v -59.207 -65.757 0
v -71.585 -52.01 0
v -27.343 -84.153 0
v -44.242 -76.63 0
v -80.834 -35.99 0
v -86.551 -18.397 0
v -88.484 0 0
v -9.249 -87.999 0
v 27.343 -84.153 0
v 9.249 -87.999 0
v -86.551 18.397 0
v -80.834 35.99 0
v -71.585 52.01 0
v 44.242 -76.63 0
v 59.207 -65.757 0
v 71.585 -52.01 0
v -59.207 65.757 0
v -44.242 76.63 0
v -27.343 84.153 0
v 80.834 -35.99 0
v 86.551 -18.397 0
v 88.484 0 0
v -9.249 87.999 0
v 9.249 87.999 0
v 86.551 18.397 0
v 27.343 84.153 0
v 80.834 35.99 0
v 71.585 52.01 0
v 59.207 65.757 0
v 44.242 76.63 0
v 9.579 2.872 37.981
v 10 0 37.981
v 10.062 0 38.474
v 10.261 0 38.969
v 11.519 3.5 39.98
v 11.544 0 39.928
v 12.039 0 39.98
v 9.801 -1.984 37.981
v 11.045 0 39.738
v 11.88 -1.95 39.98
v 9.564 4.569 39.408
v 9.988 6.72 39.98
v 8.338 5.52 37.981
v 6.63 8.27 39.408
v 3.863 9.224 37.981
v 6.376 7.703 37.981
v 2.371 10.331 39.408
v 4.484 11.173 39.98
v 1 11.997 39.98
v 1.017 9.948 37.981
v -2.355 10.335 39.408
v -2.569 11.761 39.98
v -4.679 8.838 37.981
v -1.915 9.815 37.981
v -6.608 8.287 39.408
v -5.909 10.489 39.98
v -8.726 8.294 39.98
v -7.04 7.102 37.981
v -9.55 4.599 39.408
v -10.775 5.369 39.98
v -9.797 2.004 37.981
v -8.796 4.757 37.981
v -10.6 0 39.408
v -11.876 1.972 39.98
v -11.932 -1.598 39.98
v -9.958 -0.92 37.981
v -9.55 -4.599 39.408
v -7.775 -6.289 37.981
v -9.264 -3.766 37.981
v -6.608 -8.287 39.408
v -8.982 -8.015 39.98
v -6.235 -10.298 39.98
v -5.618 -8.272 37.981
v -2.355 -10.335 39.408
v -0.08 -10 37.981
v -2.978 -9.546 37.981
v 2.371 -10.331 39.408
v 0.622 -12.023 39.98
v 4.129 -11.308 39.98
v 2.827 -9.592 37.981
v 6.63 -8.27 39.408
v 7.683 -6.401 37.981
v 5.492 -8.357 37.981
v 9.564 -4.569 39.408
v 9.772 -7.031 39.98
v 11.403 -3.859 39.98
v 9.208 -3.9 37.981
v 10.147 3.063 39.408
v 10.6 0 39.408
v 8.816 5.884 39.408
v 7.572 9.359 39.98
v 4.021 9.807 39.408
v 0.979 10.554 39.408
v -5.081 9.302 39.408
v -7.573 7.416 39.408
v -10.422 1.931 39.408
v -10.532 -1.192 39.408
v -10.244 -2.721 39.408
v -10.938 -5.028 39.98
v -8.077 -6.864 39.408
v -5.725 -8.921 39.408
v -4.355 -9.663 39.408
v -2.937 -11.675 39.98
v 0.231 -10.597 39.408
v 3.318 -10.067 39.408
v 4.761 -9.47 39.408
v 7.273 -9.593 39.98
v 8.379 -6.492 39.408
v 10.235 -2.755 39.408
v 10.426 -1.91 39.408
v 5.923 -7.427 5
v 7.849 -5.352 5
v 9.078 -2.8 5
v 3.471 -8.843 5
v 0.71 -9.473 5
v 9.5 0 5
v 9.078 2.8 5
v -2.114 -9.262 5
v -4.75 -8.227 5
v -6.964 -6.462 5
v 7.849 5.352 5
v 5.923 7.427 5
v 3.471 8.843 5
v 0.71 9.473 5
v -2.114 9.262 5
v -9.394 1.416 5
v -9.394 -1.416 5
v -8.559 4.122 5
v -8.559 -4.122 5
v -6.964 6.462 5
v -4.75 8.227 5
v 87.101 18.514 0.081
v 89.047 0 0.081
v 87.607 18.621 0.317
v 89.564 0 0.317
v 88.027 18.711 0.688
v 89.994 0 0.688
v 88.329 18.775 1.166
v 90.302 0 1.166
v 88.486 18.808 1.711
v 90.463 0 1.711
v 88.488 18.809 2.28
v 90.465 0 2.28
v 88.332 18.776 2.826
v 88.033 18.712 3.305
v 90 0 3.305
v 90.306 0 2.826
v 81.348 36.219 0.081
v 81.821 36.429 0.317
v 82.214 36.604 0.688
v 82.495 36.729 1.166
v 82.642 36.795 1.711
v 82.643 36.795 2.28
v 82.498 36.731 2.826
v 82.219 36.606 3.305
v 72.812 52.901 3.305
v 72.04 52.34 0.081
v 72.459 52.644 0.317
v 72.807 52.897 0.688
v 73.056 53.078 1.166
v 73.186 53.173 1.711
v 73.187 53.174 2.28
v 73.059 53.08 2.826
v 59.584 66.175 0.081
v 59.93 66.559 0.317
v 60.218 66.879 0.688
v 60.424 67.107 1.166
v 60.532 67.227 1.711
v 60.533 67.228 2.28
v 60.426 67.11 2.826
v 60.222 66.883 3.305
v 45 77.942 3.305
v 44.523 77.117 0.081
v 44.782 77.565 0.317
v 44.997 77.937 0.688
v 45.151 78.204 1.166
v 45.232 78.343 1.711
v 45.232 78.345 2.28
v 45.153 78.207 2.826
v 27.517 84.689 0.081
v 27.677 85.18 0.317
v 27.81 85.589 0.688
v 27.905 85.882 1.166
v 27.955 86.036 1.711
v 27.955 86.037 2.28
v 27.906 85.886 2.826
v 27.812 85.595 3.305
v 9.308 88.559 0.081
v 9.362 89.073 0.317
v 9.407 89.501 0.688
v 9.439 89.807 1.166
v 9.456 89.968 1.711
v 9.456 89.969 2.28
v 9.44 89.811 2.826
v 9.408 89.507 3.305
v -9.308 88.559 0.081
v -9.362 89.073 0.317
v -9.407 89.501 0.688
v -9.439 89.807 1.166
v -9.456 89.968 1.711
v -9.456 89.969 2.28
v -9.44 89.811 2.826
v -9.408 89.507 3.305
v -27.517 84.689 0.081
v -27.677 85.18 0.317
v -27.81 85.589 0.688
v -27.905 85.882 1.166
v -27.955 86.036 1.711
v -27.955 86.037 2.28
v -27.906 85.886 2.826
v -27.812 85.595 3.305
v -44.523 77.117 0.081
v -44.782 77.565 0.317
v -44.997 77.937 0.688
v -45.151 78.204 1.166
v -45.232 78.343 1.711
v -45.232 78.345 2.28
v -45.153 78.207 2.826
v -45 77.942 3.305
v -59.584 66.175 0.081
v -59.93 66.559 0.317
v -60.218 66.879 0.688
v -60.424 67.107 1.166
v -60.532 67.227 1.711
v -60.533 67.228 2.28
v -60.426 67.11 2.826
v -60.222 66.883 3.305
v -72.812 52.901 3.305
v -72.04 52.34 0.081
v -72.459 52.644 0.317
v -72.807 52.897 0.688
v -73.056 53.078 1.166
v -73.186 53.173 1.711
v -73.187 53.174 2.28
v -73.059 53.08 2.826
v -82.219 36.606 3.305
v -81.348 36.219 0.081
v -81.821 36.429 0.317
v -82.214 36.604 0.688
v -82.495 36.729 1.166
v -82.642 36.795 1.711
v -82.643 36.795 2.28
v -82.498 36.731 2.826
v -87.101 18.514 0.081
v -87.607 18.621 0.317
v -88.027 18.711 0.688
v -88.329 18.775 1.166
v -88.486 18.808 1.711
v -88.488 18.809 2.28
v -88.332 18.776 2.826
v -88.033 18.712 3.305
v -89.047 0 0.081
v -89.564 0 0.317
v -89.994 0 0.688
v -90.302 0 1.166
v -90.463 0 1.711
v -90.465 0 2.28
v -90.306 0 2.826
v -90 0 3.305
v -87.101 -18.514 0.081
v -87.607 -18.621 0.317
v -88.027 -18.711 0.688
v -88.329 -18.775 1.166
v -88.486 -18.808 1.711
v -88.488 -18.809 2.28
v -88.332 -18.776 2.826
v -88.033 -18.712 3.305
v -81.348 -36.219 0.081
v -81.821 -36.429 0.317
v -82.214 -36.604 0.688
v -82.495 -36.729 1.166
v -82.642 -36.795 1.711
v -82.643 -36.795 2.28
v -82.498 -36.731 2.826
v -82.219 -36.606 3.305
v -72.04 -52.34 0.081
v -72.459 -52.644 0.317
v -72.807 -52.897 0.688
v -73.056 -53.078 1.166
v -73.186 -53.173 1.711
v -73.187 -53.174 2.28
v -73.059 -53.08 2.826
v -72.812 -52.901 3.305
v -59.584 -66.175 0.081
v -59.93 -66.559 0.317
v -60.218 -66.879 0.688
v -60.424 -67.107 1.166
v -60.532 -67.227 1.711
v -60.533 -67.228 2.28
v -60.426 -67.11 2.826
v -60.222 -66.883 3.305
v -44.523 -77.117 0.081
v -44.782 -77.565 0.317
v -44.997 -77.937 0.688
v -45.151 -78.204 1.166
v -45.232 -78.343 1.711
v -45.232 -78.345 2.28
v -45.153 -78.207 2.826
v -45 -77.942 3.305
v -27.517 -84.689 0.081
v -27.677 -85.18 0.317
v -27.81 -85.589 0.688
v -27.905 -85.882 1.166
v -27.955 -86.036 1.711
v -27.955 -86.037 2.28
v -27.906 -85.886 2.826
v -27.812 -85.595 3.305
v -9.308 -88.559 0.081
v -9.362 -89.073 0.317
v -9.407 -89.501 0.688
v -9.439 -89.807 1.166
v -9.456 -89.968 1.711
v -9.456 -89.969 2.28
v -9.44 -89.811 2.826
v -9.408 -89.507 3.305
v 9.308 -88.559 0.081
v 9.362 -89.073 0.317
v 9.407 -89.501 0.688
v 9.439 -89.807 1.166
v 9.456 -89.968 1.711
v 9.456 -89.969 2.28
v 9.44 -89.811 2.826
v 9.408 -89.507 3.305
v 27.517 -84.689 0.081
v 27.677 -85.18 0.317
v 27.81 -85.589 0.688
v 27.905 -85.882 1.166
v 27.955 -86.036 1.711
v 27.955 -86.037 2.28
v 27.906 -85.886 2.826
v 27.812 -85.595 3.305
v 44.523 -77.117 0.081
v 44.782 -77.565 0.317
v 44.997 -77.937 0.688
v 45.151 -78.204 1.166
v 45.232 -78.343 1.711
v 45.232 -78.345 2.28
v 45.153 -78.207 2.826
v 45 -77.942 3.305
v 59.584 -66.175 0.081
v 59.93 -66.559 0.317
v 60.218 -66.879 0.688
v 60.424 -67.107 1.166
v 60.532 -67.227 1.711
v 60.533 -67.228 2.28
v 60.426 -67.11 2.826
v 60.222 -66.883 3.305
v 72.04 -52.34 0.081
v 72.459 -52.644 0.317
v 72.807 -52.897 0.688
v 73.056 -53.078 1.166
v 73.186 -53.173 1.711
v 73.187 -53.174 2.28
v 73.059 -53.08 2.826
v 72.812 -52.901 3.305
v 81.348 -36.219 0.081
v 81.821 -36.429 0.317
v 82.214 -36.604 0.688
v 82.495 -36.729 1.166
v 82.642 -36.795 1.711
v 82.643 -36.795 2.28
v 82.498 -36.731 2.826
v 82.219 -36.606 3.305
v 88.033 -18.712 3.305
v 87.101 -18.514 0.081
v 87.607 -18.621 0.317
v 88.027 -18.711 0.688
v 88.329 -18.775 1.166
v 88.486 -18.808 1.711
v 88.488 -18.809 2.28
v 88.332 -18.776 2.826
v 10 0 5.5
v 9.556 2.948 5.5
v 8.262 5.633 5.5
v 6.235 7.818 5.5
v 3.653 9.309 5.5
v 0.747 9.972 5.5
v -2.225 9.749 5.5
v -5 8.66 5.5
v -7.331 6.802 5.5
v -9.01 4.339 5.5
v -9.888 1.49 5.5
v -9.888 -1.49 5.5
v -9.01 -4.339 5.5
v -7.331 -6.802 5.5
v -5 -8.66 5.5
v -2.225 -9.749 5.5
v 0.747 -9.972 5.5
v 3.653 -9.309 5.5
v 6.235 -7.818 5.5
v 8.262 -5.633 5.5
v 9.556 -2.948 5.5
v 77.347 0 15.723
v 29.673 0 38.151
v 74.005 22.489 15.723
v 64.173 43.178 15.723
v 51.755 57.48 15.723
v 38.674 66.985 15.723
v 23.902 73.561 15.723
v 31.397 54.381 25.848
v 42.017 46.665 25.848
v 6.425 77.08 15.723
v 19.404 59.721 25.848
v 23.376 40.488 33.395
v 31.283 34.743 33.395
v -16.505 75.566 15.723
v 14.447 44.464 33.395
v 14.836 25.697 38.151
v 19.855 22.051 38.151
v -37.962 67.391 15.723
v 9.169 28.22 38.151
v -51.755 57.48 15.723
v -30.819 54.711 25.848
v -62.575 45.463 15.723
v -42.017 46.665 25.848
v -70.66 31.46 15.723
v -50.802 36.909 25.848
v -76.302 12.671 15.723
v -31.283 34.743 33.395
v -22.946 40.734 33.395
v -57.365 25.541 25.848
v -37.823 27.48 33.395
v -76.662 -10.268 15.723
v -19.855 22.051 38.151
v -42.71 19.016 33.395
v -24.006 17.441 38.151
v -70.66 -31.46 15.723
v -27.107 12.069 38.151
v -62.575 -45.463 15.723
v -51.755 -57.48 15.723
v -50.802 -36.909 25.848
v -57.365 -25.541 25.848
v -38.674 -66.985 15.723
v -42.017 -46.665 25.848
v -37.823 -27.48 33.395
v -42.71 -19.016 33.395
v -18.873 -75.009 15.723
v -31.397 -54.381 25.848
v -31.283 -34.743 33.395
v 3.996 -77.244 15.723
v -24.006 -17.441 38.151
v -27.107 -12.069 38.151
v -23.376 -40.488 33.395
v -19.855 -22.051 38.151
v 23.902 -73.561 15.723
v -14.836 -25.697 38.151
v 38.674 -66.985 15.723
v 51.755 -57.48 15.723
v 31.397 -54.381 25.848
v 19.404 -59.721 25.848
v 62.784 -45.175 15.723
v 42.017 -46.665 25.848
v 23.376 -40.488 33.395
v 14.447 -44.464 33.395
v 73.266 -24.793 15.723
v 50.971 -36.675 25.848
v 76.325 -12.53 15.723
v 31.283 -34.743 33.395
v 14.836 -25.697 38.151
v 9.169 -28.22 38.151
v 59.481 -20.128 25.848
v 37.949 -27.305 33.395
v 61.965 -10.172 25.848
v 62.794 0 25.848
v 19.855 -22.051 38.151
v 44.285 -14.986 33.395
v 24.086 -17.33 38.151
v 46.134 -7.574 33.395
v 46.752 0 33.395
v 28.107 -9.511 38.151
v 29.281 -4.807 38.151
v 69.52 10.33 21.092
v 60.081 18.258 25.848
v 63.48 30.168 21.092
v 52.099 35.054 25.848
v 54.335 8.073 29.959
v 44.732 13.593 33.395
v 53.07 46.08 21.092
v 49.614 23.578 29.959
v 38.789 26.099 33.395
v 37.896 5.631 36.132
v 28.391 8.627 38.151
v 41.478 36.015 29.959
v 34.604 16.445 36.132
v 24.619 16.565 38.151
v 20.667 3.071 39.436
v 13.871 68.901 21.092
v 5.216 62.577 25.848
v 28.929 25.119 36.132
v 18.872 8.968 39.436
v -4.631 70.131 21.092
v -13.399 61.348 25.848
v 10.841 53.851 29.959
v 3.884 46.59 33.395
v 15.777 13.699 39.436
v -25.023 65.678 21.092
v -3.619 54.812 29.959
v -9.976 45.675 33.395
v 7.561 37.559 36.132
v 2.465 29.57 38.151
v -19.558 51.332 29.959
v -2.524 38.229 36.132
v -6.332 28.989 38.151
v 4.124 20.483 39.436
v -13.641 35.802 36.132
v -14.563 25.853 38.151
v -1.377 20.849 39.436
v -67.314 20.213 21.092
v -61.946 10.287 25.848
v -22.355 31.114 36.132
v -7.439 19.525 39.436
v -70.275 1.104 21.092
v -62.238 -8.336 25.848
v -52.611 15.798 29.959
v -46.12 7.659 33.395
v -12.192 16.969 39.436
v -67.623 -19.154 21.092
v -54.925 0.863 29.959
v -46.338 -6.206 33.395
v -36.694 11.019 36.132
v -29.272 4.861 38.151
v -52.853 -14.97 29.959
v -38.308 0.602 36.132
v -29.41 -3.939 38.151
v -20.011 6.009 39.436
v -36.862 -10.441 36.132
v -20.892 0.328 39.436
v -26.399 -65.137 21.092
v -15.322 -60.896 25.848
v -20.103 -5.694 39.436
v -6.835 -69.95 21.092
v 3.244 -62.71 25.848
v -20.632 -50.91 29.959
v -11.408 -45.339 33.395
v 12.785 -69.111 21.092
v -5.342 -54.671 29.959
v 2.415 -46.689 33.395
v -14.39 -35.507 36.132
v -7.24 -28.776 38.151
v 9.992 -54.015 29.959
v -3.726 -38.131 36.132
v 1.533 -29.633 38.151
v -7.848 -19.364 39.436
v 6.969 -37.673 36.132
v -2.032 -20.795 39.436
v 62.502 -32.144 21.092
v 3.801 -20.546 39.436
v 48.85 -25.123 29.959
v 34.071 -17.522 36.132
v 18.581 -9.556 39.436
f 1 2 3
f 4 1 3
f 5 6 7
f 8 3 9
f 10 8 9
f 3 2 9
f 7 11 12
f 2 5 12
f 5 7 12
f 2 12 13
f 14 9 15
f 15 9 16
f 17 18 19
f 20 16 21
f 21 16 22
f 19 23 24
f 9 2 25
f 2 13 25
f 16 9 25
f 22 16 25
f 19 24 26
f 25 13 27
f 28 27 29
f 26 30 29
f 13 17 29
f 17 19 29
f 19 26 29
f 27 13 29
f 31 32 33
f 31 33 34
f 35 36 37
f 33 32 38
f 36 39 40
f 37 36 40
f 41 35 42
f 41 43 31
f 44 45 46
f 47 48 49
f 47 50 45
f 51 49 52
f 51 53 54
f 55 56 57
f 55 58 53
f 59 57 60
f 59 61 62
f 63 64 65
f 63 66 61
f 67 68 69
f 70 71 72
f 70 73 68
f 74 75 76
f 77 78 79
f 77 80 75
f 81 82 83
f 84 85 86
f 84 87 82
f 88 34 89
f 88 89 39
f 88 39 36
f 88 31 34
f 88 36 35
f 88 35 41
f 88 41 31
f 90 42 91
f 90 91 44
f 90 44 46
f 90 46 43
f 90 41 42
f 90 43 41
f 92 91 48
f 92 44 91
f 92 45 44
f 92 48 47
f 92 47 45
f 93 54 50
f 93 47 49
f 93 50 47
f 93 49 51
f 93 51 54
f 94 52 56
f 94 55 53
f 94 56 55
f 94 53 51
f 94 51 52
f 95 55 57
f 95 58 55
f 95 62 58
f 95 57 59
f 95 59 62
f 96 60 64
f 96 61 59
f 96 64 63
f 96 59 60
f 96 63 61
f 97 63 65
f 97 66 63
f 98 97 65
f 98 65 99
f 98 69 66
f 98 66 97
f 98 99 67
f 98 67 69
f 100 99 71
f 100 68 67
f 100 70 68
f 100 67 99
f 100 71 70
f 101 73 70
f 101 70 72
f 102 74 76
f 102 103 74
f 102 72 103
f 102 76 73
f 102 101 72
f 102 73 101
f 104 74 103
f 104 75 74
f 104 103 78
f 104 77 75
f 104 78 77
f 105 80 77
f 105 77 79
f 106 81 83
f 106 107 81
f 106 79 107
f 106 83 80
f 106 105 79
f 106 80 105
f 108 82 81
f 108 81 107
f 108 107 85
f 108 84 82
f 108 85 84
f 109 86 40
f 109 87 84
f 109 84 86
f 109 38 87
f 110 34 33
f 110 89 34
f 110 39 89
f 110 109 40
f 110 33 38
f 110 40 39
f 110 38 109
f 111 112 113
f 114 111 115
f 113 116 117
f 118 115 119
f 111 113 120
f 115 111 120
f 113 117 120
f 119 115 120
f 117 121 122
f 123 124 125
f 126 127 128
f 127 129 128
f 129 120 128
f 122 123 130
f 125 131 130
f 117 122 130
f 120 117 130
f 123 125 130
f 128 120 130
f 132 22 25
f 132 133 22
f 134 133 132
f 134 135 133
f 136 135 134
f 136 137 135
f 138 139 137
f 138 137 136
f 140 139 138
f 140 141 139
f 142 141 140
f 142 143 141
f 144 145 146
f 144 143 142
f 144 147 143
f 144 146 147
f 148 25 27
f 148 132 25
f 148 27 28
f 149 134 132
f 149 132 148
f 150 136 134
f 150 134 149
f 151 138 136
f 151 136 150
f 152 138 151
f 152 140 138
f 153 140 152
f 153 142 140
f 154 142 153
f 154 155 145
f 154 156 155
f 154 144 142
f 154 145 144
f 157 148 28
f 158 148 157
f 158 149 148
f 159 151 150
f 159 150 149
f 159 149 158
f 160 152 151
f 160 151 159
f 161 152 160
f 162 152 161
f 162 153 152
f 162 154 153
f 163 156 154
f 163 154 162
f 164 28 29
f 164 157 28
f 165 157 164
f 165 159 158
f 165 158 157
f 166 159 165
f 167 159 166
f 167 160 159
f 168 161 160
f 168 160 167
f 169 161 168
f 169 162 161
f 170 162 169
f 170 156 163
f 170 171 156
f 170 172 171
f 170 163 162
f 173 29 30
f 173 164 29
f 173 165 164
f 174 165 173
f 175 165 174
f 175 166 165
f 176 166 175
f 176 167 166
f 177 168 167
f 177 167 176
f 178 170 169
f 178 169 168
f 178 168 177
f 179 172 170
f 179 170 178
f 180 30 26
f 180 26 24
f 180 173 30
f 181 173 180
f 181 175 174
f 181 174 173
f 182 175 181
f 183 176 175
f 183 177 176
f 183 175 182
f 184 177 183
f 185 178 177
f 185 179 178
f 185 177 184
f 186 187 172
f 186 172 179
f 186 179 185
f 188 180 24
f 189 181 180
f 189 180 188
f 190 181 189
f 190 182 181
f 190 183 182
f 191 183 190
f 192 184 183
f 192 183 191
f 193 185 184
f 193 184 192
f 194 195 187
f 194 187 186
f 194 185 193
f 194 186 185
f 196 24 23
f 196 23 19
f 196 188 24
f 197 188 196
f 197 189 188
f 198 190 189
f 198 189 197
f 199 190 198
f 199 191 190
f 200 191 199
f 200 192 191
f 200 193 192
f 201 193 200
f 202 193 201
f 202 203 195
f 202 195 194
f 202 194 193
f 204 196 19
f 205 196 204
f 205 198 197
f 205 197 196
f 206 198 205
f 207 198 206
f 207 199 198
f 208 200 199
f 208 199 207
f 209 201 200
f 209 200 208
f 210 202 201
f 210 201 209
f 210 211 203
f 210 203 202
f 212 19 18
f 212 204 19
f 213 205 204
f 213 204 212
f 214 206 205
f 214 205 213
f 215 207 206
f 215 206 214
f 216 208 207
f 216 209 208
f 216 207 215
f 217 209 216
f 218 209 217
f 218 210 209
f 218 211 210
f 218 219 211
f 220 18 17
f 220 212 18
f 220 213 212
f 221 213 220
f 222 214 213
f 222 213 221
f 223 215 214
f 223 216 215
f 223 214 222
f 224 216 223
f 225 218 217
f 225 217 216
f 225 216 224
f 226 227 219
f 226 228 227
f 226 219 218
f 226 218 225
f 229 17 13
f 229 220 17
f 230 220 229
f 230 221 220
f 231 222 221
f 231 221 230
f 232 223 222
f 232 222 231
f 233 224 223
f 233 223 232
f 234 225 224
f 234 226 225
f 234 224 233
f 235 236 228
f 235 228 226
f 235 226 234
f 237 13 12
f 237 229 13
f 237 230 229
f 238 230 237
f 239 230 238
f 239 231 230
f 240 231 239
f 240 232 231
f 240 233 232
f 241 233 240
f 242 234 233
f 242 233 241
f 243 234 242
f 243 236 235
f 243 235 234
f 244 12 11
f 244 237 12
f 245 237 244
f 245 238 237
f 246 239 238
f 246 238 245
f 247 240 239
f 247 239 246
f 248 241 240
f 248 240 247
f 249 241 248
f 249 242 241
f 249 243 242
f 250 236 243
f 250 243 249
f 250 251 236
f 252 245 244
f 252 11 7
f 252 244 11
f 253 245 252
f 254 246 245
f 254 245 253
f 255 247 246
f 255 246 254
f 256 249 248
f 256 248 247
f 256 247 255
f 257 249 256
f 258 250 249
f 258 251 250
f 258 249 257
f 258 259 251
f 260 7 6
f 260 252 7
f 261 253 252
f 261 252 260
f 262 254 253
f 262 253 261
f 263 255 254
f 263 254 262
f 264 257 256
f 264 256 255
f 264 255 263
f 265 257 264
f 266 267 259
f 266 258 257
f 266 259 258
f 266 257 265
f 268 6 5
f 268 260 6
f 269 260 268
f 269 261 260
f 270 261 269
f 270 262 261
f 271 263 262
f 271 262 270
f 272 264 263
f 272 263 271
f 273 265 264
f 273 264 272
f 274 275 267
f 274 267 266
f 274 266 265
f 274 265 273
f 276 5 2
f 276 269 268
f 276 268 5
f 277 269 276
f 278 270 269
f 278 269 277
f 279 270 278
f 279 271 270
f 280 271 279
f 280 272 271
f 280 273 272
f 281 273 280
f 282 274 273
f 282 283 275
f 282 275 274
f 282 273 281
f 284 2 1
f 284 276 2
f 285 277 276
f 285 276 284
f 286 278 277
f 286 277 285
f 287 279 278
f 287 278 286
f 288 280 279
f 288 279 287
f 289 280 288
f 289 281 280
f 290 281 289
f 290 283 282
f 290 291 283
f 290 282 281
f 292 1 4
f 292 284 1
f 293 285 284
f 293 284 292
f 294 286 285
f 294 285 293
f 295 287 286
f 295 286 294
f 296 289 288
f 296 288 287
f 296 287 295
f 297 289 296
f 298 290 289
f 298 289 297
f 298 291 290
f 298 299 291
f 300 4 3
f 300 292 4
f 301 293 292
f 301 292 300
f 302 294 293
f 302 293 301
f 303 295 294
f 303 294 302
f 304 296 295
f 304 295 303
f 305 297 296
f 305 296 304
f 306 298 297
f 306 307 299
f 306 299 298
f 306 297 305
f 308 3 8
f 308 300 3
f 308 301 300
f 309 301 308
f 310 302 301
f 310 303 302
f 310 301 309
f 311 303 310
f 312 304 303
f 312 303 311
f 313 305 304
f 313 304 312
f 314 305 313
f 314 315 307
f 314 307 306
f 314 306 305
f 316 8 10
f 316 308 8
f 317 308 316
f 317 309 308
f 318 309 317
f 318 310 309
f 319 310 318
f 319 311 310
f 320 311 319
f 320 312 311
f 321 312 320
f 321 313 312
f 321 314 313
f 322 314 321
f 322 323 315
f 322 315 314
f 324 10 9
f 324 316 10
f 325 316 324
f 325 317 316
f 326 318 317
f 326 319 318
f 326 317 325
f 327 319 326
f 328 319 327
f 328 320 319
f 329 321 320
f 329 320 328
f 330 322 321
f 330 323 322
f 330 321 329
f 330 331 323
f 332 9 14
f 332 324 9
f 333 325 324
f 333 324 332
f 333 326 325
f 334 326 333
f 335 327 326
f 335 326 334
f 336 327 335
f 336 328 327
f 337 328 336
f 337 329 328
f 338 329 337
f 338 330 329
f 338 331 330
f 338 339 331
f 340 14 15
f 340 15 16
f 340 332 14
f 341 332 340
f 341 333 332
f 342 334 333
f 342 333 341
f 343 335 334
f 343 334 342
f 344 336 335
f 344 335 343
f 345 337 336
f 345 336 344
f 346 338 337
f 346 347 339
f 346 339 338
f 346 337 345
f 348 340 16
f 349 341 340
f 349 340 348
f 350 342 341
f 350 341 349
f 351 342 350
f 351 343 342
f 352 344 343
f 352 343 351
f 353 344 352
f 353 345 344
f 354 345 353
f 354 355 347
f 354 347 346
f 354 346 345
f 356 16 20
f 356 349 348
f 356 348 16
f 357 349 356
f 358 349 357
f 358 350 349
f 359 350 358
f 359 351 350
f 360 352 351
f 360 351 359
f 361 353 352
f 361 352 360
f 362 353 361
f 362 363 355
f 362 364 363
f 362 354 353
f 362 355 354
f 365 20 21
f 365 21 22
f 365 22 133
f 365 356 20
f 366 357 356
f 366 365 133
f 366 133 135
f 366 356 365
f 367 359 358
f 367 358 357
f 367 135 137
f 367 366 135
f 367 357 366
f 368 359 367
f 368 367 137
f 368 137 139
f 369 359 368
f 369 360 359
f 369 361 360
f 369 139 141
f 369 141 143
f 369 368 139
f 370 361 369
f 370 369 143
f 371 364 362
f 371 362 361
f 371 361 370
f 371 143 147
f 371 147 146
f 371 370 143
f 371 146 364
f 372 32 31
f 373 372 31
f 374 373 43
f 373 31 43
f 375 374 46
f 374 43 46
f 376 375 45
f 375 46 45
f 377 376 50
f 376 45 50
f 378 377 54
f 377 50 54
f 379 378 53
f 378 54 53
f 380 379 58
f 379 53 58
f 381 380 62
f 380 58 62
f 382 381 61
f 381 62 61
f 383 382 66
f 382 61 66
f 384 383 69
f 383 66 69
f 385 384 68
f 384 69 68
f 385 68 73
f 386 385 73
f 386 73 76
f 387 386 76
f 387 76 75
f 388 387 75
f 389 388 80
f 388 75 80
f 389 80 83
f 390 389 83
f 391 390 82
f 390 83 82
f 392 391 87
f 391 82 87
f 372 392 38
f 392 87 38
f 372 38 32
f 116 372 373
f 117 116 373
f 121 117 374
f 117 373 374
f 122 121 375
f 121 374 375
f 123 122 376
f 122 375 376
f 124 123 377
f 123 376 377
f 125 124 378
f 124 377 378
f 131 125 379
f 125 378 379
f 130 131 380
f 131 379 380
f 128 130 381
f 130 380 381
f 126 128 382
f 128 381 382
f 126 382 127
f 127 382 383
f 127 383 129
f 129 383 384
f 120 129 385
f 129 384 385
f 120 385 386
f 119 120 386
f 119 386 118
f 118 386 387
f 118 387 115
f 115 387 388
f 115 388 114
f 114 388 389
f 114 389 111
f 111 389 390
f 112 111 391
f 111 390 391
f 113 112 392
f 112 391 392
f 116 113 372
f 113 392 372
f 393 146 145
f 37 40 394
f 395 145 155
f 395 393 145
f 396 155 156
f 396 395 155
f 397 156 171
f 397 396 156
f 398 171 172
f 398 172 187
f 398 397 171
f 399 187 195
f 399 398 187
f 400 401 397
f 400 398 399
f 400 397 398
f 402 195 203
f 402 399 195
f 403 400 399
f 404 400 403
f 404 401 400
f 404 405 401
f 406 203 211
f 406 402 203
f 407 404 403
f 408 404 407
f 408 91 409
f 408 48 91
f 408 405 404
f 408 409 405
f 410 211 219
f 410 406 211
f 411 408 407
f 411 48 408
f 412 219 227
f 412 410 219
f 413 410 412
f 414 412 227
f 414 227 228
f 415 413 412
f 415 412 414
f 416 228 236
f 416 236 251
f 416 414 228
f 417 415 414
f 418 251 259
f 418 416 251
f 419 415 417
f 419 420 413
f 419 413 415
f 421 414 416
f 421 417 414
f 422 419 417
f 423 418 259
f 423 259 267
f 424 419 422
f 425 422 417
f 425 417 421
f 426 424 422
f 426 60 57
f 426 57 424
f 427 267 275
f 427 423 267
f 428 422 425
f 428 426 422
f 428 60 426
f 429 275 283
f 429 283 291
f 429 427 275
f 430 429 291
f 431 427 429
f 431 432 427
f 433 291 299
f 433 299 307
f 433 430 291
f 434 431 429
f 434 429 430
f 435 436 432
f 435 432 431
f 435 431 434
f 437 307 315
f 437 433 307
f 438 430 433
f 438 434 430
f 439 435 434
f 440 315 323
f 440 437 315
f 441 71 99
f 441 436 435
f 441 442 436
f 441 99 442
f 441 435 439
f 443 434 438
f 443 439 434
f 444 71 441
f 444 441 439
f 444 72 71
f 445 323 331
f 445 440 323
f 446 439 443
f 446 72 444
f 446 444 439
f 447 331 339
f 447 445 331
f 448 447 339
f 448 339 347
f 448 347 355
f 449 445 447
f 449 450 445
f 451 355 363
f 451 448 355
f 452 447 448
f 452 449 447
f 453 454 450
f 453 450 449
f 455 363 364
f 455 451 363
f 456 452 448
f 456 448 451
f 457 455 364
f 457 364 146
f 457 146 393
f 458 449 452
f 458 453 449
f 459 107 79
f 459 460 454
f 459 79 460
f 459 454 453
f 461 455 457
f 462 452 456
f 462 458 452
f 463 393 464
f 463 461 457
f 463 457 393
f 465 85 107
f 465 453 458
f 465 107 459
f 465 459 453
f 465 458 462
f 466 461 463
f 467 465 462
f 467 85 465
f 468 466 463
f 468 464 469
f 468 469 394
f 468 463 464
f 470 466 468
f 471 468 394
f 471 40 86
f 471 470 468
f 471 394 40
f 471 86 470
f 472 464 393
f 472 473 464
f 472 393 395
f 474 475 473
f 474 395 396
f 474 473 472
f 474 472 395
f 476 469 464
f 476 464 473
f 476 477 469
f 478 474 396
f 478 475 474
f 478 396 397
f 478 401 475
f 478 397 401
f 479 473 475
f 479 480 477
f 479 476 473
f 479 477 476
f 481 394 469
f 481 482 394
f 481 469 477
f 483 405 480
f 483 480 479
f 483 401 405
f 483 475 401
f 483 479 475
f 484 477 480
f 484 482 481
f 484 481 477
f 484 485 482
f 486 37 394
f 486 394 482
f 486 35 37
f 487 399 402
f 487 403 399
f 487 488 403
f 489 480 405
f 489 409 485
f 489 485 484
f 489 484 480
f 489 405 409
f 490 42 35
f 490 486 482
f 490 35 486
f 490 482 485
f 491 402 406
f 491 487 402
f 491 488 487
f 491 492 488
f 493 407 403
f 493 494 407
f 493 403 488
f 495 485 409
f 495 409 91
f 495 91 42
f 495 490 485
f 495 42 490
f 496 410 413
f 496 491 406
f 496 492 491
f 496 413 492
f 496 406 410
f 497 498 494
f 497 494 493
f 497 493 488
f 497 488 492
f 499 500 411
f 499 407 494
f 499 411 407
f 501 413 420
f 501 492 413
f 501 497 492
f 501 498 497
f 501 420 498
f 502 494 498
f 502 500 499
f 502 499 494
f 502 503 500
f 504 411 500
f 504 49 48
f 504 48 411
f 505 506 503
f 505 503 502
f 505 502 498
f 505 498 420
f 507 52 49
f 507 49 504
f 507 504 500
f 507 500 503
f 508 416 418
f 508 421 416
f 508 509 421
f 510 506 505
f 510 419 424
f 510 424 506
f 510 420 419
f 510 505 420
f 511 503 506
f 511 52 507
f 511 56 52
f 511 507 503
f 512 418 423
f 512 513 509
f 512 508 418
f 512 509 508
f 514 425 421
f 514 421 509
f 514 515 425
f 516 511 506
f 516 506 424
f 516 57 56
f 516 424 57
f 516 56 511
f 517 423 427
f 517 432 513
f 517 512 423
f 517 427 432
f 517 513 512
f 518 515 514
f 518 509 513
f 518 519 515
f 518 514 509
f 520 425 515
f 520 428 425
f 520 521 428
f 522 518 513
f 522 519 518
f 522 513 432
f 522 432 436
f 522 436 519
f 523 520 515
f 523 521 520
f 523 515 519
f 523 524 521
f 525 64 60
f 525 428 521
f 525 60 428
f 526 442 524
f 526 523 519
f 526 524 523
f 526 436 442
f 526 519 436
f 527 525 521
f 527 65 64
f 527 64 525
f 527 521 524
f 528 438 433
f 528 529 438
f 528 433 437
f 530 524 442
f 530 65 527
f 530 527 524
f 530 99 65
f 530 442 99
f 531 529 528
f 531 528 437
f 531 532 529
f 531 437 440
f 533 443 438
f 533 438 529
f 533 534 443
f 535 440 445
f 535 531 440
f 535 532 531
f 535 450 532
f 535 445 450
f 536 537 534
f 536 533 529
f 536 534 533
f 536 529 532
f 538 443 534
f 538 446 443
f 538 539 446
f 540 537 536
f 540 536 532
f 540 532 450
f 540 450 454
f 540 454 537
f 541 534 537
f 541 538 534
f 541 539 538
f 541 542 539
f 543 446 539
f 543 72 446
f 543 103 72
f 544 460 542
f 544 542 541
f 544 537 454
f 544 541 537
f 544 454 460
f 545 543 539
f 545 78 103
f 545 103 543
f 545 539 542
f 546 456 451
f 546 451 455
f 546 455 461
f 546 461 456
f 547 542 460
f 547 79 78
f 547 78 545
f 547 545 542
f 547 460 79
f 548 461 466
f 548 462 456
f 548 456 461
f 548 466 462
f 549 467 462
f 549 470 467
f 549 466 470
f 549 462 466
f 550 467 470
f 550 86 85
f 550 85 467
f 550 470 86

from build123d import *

# Parameters (mm, degrees)
CHAMFER_SIZE = 0.5
FILLET_R     = 2


with BuildPart() as part:
    # Sketch → Revolution (revolve)
    with BuildSketch(Plane.XZ):
        with BuildLine():
            Line((0, 0), (0, 5))
            Line((0, 5), (10, 5))
            Line((10, 5), (10, 40))
            ThreePointArc((90, 3.304699), (54.00723, 30.388574), (10, 40))
            ThreePointArc((88.484163, 0), (90.302047, 1.166153), (90, 3.304699))
            Line((88.484163, 0), (0, 0))
        make_face()
    revolve(axis=Axis((0, 0, 0), (0, 0, 1)))

    # Chamfer
    chamfer_edges = [part.edges().sort_by_distance(p)[0] for p in [
        (-10, 0, 5),
    ]]
    chamfer(chamfer_edges, length=CHAMFER_SIZE)

    # Fillet
    fillet_edges = [part.edges().sort_by_distance(p)[0] for p in [
        (-10, 0, 40),
    ]]
    fillet(fillet_edges, radius=FILLET_R)


solid = part.part
